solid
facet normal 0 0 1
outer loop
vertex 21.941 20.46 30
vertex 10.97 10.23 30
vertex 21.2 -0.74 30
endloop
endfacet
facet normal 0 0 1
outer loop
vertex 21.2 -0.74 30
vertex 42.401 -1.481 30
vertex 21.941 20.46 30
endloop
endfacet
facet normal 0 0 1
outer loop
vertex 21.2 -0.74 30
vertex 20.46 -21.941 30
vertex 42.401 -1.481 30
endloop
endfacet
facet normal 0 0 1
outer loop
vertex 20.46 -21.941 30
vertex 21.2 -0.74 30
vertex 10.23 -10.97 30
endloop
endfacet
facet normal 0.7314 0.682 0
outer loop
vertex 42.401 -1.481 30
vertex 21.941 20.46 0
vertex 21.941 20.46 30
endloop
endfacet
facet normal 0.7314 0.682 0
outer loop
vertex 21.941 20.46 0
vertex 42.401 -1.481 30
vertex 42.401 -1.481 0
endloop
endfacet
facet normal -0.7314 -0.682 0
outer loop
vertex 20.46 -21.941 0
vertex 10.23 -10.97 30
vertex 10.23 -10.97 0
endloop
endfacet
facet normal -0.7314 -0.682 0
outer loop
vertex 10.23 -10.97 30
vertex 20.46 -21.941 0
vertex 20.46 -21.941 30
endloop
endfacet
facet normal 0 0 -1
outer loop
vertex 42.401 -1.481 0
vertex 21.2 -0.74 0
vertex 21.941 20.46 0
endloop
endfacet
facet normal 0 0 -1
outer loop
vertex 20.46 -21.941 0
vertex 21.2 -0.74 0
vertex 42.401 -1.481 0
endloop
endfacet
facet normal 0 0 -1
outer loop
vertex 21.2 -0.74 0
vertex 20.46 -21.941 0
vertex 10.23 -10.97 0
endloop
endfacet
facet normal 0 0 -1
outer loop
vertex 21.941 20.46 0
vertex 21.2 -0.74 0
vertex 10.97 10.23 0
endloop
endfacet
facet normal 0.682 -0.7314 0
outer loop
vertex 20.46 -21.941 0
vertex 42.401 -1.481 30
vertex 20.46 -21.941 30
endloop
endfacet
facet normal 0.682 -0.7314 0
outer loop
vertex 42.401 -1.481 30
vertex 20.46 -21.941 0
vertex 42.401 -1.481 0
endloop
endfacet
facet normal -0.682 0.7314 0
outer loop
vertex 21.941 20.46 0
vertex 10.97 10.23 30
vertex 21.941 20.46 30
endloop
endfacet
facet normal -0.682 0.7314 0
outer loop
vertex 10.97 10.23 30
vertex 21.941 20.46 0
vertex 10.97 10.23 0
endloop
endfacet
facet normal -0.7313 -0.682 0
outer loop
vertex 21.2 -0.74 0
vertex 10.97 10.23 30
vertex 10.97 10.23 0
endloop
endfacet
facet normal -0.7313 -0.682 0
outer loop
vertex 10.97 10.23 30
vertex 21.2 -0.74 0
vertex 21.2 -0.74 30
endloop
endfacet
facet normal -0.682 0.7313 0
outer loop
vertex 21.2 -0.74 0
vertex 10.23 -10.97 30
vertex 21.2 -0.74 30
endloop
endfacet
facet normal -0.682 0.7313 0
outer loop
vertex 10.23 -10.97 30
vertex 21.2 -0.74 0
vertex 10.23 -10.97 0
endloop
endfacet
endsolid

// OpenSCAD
rotate([0,0,-92])
rotate([0,-90,0]){
    difference(){
        rotate([-45,0,0]) {
            cube([30, 30, 30]);
        }
        scale([1,0.5,0.5]) {
            rotate([-45,0,0]) {
                cube([30, 30, 30]);
            }
        }
    }
}
